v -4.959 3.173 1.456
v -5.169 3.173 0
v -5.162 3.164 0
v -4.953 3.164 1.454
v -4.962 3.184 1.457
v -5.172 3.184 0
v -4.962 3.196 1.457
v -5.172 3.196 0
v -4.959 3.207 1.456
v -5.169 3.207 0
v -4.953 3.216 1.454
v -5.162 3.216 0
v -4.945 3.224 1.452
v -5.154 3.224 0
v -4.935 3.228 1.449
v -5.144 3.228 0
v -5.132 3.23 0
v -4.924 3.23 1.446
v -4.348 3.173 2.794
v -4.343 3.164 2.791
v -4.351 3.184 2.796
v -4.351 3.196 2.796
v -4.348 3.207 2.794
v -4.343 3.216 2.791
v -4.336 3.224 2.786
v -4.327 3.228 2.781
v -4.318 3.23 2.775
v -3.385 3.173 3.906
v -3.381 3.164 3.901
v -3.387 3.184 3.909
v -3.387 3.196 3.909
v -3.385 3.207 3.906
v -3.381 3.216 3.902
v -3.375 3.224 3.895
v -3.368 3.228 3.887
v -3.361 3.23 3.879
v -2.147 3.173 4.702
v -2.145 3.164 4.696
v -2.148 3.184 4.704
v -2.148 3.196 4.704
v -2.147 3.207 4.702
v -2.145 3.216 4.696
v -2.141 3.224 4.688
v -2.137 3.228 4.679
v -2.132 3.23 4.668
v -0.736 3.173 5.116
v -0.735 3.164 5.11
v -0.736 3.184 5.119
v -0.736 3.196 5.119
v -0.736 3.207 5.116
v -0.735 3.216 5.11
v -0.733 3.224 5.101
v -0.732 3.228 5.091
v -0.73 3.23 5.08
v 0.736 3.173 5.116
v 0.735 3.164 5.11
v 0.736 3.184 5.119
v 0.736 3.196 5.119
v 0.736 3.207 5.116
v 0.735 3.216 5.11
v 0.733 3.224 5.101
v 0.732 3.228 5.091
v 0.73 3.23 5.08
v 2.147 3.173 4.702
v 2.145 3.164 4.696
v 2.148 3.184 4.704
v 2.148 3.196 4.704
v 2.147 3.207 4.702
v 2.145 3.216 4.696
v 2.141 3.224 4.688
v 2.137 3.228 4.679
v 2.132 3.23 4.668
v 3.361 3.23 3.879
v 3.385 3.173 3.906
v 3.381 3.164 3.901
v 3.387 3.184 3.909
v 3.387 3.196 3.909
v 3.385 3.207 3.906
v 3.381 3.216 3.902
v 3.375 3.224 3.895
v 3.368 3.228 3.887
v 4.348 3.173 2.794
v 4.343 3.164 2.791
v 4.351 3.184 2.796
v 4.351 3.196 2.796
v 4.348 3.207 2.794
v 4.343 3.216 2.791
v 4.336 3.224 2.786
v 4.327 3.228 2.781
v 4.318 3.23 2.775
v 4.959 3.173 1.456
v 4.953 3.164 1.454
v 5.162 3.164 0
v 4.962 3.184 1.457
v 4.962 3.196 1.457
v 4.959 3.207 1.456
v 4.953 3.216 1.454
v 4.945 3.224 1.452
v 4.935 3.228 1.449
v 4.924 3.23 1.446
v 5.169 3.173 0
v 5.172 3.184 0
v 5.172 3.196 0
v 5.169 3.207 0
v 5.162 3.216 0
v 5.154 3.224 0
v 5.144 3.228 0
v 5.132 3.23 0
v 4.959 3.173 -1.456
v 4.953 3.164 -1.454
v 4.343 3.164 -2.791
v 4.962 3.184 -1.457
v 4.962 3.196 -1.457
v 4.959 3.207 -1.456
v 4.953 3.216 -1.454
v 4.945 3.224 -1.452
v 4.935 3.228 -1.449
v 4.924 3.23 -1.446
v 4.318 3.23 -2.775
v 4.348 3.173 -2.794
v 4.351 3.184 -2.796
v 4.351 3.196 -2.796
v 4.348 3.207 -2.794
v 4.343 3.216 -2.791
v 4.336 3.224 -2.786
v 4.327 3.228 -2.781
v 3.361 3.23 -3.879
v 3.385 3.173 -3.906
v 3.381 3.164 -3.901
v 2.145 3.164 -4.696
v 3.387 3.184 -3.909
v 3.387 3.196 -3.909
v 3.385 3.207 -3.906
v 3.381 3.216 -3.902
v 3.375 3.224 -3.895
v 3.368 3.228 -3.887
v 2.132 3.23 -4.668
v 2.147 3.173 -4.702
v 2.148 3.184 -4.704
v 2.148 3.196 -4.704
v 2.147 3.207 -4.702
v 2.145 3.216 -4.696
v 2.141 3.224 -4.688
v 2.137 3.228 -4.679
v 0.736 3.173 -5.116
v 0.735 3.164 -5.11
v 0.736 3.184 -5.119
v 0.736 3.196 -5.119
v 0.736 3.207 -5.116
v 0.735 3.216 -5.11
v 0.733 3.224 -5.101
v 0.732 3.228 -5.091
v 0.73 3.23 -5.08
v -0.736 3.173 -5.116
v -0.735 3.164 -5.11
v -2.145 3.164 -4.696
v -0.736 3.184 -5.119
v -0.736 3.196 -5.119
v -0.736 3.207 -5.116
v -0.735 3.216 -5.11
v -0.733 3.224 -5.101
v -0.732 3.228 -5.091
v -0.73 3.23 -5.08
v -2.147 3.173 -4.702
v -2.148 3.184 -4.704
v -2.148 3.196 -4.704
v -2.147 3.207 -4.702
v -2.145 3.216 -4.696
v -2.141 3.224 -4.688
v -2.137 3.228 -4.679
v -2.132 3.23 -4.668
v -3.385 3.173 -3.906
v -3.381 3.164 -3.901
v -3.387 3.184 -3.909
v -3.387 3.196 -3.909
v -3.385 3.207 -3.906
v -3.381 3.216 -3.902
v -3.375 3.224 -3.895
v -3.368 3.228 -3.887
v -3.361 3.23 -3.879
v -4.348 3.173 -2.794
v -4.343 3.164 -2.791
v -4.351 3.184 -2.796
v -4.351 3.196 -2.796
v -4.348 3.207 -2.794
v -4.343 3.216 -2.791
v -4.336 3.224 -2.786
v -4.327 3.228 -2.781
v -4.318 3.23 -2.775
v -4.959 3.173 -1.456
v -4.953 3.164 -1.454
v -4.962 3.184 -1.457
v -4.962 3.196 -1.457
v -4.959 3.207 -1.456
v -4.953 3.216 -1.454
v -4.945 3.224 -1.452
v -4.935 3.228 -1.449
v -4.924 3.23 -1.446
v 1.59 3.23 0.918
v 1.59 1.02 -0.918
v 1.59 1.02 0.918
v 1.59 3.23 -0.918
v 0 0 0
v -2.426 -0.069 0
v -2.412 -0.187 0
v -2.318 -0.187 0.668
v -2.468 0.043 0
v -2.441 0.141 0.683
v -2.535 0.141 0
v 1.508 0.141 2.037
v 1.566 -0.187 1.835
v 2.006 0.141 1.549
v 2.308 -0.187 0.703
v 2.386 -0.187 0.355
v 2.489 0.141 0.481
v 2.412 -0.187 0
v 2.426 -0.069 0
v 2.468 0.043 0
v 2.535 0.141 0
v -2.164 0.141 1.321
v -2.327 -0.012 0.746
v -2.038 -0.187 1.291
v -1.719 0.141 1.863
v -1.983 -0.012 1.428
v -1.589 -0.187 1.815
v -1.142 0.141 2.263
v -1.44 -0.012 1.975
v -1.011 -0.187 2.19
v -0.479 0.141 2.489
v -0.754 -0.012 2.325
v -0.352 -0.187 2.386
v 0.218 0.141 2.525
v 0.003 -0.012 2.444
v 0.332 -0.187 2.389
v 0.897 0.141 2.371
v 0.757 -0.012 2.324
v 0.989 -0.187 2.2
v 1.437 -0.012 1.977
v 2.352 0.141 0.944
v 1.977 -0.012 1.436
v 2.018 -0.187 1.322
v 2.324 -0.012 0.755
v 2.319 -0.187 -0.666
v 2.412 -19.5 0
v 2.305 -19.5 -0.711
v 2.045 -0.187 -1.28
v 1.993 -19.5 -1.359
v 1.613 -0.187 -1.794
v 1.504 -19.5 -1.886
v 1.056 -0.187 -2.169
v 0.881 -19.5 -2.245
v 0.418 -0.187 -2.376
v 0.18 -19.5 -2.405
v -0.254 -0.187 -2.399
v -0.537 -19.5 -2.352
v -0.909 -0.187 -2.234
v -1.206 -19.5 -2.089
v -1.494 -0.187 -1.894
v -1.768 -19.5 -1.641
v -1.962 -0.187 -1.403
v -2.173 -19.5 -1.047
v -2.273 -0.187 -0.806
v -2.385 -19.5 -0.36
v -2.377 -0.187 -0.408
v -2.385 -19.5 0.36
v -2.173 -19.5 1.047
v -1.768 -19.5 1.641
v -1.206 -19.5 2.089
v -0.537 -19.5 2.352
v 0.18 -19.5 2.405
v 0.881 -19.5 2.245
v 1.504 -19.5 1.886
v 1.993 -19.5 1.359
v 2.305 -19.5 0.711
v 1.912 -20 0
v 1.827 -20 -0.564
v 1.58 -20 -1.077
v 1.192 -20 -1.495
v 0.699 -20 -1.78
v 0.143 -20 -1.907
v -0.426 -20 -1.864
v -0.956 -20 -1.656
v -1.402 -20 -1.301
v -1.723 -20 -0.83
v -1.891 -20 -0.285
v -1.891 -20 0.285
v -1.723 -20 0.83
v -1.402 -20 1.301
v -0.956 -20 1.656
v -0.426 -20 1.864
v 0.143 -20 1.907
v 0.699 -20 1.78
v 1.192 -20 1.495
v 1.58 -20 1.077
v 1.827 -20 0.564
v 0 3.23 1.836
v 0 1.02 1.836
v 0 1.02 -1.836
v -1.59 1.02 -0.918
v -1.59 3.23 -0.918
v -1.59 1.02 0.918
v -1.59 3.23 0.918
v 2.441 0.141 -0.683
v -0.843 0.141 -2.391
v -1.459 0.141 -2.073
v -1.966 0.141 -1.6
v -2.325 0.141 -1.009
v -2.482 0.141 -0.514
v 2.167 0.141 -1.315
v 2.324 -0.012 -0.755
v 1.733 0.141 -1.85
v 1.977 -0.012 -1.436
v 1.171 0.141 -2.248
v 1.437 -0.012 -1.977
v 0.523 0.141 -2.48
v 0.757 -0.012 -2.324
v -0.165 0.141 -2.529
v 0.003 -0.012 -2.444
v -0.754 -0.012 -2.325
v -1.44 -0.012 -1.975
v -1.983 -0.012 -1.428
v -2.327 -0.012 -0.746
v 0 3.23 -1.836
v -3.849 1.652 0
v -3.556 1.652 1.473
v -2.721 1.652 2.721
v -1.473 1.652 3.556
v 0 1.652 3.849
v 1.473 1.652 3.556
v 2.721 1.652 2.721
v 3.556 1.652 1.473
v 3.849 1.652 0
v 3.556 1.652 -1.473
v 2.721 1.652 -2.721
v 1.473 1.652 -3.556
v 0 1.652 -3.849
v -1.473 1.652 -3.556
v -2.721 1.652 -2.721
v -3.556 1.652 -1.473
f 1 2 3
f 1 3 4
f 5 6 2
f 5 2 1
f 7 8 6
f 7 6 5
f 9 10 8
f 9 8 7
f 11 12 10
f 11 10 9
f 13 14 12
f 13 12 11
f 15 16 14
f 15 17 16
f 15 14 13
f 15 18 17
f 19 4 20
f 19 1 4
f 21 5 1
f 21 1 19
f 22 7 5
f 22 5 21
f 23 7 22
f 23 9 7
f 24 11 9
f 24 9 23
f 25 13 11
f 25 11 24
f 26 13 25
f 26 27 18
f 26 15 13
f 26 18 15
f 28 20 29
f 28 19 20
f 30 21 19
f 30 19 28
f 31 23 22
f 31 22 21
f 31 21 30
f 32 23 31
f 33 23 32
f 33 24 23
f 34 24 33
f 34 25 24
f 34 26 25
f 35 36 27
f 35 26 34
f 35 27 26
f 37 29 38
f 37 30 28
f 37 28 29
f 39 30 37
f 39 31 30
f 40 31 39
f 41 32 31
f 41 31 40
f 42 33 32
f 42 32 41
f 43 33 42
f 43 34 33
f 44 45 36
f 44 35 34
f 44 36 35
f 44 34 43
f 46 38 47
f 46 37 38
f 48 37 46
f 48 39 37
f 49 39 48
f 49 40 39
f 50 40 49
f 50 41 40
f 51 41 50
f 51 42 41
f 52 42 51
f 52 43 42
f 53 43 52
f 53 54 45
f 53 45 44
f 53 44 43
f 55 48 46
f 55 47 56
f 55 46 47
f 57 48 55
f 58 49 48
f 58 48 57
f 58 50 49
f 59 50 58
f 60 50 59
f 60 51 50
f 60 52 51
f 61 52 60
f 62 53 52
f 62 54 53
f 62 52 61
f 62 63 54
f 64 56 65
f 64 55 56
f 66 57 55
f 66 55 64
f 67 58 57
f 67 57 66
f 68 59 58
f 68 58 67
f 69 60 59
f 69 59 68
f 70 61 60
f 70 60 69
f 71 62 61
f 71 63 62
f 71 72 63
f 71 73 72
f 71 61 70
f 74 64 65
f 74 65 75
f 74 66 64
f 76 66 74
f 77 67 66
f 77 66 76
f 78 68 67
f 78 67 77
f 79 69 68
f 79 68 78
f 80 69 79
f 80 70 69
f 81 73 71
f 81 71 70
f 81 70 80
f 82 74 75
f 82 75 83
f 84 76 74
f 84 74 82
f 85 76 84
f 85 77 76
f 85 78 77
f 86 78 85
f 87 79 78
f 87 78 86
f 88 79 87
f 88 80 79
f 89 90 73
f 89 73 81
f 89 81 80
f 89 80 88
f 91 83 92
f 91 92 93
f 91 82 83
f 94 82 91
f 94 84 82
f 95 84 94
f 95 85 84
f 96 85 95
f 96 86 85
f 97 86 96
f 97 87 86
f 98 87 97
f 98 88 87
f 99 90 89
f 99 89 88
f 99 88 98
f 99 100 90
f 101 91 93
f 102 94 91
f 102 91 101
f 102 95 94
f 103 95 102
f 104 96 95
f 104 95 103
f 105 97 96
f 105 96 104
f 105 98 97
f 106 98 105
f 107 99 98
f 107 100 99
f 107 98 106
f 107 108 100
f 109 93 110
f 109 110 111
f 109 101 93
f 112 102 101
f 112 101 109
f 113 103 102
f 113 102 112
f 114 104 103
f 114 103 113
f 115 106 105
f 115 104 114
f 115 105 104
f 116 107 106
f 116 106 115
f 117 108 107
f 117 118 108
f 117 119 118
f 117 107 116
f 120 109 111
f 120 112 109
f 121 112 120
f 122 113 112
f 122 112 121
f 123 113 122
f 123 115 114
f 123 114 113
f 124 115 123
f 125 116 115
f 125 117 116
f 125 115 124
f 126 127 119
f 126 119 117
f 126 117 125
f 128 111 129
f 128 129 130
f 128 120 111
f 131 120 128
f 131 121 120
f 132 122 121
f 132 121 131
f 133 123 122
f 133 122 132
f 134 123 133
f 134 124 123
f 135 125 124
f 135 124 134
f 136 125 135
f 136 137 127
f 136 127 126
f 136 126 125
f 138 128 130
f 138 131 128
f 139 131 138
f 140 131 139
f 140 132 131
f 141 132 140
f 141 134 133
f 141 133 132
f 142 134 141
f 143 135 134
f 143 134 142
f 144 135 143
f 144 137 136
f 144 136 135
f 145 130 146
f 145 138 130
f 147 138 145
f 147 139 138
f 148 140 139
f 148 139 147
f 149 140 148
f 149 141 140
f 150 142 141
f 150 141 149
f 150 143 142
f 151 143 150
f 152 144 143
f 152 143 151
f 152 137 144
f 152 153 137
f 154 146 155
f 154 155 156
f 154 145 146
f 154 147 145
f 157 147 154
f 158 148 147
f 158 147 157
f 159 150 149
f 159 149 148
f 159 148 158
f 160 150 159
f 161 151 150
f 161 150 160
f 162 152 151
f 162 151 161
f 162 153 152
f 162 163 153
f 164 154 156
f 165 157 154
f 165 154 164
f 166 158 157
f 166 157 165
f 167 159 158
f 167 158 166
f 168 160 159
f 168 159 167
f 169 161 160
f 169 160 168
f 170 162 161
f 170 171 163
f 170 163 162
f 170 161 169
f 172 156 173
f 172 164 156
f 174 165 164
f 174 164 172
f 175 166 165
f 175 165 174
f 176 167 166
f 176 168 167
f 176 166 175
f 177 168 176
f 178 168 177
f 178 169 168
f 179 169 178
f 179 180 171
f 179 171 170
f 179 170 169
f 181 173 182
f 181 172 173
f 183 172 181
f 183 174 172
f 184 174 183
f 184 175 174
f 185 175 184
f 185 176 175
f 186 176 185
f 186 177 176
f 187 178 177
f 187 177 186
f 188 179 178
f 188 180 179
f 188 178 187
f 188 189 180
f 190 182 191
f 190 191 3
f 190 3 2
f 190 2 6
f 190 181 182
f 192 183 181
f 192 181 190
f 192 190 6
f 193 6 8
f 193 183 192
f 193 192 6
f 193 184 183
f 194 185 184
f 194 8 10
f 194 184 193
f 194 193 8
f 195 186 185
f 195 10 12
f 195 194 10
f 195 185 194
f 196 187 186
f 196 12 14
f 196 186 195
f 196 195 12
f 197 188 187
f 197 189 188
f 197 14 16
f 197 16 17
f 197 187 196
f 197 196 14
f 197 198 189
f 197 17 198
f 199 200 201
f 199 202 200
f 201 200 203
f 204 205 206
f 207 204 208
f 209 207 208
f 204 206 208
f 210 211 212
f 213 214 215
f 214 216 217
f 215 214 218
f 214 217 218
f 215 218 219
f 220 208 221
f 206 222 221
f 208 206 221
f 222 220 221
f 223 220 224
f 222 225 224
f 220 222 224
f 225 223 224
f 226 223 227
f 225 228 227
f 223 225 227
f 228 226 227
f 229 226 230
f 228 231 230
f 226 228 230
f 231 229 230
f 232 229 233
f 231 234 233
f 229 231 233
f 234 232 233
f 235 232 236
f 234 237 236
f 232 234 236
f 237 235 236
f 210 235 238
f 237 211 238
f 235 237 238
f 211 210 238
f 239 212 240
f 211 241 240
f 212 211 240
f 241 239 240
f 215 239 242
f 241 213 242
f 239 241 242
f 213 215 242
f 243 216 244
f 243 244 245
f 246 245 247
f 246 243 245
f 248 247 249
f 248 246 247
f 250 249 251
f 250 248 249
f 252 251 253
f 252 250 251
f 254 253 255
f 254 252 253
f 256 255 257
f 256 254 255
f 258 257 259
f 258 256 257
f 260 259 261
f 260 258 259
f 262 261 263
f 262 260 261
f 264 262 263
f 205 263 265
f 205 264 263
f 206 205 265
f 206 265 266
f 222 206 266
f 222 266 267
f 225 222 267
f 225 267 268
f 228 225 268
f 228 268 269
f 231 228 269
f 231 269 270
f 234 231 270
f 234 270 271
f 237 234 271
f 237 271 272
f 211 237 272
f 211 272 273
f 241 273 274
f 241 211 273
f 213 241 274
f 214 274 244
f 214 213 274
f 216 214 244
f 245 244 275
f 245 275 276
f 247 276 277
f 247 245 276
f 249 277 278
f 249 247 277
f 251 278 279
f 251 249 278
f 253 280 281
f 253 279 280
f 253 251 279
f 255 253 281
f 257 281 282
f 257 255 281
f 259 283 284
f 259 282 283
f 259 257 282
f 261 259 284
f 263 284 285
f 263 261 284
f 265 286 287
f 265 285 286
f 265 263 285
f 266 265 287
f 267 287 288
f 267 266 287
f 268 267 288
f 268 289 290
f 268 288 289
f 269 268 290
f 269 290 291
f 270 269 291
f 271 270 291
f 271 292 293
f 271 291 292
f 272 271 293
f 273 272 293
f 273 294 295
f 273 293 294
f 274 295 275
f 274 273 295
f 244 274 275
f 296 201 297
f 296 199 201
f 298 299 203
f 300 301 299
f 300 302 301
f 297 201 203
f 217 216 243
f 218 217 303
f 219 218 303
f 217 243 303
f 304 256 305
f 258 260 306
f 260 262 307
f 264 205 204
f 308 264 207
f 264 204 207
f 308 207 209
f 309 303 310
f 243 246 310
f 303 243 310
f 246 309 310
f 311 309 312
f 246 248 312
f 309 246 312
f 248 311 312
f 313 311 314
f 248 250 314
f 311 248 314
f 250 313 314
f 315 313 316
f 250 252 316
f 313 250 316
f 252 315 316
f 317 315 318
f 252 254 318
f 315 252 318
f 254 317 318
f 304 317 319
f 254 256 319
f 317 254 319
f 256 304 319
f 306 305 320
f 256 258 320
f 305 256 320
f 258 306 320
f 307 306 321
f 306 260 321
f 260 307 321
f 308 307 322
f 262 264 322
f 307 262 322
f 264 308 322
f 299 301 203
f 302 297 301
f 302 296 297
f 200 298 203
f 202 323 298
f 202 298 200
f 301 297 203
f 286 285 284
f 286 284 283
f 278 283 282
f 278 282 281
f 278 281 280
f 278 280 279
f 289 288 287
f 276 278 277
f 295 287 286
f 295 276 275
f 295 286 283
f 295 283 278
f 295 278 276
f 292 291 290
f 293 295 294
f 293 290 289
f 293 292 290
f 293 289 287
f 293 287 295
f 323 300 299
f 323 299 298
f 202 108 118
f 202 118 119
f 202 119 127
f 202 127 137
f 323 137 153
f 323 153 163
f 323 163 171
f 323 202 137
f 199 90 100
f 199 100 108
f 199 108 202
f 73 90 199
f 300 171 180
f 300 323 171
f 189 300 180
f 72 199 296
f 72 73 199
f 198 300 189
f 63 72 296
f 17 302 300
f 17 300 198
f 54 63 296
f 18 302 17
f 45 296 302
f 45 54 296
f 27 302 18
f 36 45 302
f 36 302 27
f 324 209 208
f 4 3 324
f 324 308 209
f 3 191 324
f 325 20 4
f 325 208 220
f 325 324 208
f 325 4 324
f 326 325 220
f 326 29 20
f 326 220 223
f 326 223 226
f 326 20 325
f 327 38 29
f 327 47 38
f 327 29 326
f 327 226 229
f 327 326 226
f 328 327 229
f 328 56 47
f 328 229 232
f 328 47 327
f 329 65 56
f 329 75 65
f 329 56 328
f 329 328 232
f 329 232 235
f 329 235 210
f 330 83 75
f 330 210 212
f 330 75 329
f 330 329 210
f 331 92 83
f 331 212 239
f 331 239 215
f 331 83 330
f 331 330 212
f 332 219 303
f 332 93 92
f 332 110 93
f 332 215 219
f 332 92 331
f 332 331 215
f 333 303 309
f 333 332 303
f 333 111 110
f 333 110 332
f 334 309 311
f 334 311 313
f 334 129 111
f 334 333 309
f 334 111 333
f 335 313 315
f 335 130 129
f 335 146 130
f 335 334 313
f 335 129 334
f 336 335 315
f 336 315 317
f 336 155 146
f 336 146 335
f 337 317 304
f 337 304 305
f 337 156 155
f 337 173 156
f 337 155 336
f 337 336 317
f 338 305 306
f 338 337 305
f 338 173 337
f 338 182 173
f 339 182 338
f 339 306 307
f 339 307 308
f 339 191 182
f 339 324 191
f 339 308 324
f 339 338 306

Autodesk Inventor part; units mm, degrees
ref_plane "YZ Plane" through (0, 0, 0) normal (1, 0, 0) x (0, 1, 0)
ref_plane "XZ Plane" through (0, 0, 0) normal (0, 1, 0) x (-1, 0, 0)
ref_plane "XY Plane" through (0, 0, 0) normal (0, 0, 1) x (1, 0, 0)
sketch "Sketch1" plane through (0, 0, 0) normal (0, 0, 1) x (1, 0, 0)
  line L0 (0, 0) -> (0, 3.23)
  line L1 (0, 3.23) -> (-5.22, 3.23)
  line L2 (-5.22, 3.23) -> (-5.22, 7.9668) construction
  line L3 (-2.4122, 0) -> (-5.22, 3.23)
  line L4 (0, 0) -> (-2.4122, 0)
  line L5 (-5.22, 3.23) -> (-8.3852, 6.8711) construction
  line L6 (-4.6965, 2.6278) -> (0, 2.6278) construction
  dimension "d0" = 3.23
  dimension "d3" = 41
  dimension "d23" = 5.22
  dimension "d25" = 4.6965
revolve "Revolution1" add sketch "Sketch1" angle 360 about axis through (0, 0, 0) along (0, 1, 0)
sketch "Sketch2" plane through (0, 0, 0) normal (0, -1, 0) x (1, 0, 0)
  circle A0 centre (0, 0) radius 2.4122 projected
  dimension "d22" = 4.8244
extrude "Extrusion1" add sketch "Sketch2" along normal blind 20
sketch "Sketch3" plane through (0, 3.23, 0) normal (0, 1, 0) x (1, 0, 0)
  line L0 (0, -1.836) -> (-1.59, -0.918)
  line L1 (-1.59, -0.918) -> (-1.59, 0.918)
  line L2 (-1.59, 0.918) -> (0, 1.836)
  line L3 (0, 1.836) -> (1.59, 0.918)
  line L4 (1.59, 0.918) -> (1.59, -0.918)
  line L5 (1.59, -0.918) -> (0, -1.836)
  point P0 (0, 0)
  point P1 (0, 0)
  dimension "d8" = 3.18
extrude "Extrusion2" cut sketch "Sketch3" against normal blind 2.21
sketch "Sketch4" plane through (0, 0, 0) normal (0, 0, 1) x (1, 0, 0)
  line L0 (1.59, 1.02) -> (0, 0)
sketch "Sketch5" plane through (0, 1.02, 0) normal (0, 1, 0) x (1, 0, 0)
  line L0 (0, -1.836) -> (-1.59, -0.918)
  line L1 (1.59, -0.918) -> (0, -1.836)
  line L2 (1.59, 0.918) -> (1.59, -0.918)
  line L3 (0, 1.836) -> (1.59, 0.918)
  line L4 (-1.59, 0.918) -> (0, 1.836)
  line L5 (-1.59, -0.918) -> (-1.59, 0.918)
  point P0 (0, 0)
sketch "Sketch6" plane through (0, 0, 0) normal (0, 1, 0) x (-1, 0, 0)
  point P0 (0, 0)
  point P1 (0, 0)
sketch "Sketch7" plane through (0, 0, 0) normal (1, 0, 0) x (0, 1, 0)
  line L0 (1.02, -1.836) -> (0, 0)
loft "Loft1" cut section 1 edges at (-0.795, 1.02, 1.377) (0.795, 1.02, 1.377) (1.59, 1.02, 0) (0.795, 1.02, -1.377) (-0.795, 1.02, -1.377) (-1.59, 1.02, 0) section 2 point at (0, 0, 0)
chamfer "Chamfer1" distance 0.5 angle 45 1 edges at (-2.4122, -20, 0)
thread "Thread1" size "10-32 UNF" class "2A" standard "ANSI Unified Screw Threads" length 14
fillet "Fillet1" radius 0.5 2 edges at (0, 0, -2.4122) (0, 0, 2.4122)
fillet "Fillet2" radius 0.04 1 edges at (5.22, 3.23, 0)
properties part number "CountersunkBolt" material "Steel, Carbon"
